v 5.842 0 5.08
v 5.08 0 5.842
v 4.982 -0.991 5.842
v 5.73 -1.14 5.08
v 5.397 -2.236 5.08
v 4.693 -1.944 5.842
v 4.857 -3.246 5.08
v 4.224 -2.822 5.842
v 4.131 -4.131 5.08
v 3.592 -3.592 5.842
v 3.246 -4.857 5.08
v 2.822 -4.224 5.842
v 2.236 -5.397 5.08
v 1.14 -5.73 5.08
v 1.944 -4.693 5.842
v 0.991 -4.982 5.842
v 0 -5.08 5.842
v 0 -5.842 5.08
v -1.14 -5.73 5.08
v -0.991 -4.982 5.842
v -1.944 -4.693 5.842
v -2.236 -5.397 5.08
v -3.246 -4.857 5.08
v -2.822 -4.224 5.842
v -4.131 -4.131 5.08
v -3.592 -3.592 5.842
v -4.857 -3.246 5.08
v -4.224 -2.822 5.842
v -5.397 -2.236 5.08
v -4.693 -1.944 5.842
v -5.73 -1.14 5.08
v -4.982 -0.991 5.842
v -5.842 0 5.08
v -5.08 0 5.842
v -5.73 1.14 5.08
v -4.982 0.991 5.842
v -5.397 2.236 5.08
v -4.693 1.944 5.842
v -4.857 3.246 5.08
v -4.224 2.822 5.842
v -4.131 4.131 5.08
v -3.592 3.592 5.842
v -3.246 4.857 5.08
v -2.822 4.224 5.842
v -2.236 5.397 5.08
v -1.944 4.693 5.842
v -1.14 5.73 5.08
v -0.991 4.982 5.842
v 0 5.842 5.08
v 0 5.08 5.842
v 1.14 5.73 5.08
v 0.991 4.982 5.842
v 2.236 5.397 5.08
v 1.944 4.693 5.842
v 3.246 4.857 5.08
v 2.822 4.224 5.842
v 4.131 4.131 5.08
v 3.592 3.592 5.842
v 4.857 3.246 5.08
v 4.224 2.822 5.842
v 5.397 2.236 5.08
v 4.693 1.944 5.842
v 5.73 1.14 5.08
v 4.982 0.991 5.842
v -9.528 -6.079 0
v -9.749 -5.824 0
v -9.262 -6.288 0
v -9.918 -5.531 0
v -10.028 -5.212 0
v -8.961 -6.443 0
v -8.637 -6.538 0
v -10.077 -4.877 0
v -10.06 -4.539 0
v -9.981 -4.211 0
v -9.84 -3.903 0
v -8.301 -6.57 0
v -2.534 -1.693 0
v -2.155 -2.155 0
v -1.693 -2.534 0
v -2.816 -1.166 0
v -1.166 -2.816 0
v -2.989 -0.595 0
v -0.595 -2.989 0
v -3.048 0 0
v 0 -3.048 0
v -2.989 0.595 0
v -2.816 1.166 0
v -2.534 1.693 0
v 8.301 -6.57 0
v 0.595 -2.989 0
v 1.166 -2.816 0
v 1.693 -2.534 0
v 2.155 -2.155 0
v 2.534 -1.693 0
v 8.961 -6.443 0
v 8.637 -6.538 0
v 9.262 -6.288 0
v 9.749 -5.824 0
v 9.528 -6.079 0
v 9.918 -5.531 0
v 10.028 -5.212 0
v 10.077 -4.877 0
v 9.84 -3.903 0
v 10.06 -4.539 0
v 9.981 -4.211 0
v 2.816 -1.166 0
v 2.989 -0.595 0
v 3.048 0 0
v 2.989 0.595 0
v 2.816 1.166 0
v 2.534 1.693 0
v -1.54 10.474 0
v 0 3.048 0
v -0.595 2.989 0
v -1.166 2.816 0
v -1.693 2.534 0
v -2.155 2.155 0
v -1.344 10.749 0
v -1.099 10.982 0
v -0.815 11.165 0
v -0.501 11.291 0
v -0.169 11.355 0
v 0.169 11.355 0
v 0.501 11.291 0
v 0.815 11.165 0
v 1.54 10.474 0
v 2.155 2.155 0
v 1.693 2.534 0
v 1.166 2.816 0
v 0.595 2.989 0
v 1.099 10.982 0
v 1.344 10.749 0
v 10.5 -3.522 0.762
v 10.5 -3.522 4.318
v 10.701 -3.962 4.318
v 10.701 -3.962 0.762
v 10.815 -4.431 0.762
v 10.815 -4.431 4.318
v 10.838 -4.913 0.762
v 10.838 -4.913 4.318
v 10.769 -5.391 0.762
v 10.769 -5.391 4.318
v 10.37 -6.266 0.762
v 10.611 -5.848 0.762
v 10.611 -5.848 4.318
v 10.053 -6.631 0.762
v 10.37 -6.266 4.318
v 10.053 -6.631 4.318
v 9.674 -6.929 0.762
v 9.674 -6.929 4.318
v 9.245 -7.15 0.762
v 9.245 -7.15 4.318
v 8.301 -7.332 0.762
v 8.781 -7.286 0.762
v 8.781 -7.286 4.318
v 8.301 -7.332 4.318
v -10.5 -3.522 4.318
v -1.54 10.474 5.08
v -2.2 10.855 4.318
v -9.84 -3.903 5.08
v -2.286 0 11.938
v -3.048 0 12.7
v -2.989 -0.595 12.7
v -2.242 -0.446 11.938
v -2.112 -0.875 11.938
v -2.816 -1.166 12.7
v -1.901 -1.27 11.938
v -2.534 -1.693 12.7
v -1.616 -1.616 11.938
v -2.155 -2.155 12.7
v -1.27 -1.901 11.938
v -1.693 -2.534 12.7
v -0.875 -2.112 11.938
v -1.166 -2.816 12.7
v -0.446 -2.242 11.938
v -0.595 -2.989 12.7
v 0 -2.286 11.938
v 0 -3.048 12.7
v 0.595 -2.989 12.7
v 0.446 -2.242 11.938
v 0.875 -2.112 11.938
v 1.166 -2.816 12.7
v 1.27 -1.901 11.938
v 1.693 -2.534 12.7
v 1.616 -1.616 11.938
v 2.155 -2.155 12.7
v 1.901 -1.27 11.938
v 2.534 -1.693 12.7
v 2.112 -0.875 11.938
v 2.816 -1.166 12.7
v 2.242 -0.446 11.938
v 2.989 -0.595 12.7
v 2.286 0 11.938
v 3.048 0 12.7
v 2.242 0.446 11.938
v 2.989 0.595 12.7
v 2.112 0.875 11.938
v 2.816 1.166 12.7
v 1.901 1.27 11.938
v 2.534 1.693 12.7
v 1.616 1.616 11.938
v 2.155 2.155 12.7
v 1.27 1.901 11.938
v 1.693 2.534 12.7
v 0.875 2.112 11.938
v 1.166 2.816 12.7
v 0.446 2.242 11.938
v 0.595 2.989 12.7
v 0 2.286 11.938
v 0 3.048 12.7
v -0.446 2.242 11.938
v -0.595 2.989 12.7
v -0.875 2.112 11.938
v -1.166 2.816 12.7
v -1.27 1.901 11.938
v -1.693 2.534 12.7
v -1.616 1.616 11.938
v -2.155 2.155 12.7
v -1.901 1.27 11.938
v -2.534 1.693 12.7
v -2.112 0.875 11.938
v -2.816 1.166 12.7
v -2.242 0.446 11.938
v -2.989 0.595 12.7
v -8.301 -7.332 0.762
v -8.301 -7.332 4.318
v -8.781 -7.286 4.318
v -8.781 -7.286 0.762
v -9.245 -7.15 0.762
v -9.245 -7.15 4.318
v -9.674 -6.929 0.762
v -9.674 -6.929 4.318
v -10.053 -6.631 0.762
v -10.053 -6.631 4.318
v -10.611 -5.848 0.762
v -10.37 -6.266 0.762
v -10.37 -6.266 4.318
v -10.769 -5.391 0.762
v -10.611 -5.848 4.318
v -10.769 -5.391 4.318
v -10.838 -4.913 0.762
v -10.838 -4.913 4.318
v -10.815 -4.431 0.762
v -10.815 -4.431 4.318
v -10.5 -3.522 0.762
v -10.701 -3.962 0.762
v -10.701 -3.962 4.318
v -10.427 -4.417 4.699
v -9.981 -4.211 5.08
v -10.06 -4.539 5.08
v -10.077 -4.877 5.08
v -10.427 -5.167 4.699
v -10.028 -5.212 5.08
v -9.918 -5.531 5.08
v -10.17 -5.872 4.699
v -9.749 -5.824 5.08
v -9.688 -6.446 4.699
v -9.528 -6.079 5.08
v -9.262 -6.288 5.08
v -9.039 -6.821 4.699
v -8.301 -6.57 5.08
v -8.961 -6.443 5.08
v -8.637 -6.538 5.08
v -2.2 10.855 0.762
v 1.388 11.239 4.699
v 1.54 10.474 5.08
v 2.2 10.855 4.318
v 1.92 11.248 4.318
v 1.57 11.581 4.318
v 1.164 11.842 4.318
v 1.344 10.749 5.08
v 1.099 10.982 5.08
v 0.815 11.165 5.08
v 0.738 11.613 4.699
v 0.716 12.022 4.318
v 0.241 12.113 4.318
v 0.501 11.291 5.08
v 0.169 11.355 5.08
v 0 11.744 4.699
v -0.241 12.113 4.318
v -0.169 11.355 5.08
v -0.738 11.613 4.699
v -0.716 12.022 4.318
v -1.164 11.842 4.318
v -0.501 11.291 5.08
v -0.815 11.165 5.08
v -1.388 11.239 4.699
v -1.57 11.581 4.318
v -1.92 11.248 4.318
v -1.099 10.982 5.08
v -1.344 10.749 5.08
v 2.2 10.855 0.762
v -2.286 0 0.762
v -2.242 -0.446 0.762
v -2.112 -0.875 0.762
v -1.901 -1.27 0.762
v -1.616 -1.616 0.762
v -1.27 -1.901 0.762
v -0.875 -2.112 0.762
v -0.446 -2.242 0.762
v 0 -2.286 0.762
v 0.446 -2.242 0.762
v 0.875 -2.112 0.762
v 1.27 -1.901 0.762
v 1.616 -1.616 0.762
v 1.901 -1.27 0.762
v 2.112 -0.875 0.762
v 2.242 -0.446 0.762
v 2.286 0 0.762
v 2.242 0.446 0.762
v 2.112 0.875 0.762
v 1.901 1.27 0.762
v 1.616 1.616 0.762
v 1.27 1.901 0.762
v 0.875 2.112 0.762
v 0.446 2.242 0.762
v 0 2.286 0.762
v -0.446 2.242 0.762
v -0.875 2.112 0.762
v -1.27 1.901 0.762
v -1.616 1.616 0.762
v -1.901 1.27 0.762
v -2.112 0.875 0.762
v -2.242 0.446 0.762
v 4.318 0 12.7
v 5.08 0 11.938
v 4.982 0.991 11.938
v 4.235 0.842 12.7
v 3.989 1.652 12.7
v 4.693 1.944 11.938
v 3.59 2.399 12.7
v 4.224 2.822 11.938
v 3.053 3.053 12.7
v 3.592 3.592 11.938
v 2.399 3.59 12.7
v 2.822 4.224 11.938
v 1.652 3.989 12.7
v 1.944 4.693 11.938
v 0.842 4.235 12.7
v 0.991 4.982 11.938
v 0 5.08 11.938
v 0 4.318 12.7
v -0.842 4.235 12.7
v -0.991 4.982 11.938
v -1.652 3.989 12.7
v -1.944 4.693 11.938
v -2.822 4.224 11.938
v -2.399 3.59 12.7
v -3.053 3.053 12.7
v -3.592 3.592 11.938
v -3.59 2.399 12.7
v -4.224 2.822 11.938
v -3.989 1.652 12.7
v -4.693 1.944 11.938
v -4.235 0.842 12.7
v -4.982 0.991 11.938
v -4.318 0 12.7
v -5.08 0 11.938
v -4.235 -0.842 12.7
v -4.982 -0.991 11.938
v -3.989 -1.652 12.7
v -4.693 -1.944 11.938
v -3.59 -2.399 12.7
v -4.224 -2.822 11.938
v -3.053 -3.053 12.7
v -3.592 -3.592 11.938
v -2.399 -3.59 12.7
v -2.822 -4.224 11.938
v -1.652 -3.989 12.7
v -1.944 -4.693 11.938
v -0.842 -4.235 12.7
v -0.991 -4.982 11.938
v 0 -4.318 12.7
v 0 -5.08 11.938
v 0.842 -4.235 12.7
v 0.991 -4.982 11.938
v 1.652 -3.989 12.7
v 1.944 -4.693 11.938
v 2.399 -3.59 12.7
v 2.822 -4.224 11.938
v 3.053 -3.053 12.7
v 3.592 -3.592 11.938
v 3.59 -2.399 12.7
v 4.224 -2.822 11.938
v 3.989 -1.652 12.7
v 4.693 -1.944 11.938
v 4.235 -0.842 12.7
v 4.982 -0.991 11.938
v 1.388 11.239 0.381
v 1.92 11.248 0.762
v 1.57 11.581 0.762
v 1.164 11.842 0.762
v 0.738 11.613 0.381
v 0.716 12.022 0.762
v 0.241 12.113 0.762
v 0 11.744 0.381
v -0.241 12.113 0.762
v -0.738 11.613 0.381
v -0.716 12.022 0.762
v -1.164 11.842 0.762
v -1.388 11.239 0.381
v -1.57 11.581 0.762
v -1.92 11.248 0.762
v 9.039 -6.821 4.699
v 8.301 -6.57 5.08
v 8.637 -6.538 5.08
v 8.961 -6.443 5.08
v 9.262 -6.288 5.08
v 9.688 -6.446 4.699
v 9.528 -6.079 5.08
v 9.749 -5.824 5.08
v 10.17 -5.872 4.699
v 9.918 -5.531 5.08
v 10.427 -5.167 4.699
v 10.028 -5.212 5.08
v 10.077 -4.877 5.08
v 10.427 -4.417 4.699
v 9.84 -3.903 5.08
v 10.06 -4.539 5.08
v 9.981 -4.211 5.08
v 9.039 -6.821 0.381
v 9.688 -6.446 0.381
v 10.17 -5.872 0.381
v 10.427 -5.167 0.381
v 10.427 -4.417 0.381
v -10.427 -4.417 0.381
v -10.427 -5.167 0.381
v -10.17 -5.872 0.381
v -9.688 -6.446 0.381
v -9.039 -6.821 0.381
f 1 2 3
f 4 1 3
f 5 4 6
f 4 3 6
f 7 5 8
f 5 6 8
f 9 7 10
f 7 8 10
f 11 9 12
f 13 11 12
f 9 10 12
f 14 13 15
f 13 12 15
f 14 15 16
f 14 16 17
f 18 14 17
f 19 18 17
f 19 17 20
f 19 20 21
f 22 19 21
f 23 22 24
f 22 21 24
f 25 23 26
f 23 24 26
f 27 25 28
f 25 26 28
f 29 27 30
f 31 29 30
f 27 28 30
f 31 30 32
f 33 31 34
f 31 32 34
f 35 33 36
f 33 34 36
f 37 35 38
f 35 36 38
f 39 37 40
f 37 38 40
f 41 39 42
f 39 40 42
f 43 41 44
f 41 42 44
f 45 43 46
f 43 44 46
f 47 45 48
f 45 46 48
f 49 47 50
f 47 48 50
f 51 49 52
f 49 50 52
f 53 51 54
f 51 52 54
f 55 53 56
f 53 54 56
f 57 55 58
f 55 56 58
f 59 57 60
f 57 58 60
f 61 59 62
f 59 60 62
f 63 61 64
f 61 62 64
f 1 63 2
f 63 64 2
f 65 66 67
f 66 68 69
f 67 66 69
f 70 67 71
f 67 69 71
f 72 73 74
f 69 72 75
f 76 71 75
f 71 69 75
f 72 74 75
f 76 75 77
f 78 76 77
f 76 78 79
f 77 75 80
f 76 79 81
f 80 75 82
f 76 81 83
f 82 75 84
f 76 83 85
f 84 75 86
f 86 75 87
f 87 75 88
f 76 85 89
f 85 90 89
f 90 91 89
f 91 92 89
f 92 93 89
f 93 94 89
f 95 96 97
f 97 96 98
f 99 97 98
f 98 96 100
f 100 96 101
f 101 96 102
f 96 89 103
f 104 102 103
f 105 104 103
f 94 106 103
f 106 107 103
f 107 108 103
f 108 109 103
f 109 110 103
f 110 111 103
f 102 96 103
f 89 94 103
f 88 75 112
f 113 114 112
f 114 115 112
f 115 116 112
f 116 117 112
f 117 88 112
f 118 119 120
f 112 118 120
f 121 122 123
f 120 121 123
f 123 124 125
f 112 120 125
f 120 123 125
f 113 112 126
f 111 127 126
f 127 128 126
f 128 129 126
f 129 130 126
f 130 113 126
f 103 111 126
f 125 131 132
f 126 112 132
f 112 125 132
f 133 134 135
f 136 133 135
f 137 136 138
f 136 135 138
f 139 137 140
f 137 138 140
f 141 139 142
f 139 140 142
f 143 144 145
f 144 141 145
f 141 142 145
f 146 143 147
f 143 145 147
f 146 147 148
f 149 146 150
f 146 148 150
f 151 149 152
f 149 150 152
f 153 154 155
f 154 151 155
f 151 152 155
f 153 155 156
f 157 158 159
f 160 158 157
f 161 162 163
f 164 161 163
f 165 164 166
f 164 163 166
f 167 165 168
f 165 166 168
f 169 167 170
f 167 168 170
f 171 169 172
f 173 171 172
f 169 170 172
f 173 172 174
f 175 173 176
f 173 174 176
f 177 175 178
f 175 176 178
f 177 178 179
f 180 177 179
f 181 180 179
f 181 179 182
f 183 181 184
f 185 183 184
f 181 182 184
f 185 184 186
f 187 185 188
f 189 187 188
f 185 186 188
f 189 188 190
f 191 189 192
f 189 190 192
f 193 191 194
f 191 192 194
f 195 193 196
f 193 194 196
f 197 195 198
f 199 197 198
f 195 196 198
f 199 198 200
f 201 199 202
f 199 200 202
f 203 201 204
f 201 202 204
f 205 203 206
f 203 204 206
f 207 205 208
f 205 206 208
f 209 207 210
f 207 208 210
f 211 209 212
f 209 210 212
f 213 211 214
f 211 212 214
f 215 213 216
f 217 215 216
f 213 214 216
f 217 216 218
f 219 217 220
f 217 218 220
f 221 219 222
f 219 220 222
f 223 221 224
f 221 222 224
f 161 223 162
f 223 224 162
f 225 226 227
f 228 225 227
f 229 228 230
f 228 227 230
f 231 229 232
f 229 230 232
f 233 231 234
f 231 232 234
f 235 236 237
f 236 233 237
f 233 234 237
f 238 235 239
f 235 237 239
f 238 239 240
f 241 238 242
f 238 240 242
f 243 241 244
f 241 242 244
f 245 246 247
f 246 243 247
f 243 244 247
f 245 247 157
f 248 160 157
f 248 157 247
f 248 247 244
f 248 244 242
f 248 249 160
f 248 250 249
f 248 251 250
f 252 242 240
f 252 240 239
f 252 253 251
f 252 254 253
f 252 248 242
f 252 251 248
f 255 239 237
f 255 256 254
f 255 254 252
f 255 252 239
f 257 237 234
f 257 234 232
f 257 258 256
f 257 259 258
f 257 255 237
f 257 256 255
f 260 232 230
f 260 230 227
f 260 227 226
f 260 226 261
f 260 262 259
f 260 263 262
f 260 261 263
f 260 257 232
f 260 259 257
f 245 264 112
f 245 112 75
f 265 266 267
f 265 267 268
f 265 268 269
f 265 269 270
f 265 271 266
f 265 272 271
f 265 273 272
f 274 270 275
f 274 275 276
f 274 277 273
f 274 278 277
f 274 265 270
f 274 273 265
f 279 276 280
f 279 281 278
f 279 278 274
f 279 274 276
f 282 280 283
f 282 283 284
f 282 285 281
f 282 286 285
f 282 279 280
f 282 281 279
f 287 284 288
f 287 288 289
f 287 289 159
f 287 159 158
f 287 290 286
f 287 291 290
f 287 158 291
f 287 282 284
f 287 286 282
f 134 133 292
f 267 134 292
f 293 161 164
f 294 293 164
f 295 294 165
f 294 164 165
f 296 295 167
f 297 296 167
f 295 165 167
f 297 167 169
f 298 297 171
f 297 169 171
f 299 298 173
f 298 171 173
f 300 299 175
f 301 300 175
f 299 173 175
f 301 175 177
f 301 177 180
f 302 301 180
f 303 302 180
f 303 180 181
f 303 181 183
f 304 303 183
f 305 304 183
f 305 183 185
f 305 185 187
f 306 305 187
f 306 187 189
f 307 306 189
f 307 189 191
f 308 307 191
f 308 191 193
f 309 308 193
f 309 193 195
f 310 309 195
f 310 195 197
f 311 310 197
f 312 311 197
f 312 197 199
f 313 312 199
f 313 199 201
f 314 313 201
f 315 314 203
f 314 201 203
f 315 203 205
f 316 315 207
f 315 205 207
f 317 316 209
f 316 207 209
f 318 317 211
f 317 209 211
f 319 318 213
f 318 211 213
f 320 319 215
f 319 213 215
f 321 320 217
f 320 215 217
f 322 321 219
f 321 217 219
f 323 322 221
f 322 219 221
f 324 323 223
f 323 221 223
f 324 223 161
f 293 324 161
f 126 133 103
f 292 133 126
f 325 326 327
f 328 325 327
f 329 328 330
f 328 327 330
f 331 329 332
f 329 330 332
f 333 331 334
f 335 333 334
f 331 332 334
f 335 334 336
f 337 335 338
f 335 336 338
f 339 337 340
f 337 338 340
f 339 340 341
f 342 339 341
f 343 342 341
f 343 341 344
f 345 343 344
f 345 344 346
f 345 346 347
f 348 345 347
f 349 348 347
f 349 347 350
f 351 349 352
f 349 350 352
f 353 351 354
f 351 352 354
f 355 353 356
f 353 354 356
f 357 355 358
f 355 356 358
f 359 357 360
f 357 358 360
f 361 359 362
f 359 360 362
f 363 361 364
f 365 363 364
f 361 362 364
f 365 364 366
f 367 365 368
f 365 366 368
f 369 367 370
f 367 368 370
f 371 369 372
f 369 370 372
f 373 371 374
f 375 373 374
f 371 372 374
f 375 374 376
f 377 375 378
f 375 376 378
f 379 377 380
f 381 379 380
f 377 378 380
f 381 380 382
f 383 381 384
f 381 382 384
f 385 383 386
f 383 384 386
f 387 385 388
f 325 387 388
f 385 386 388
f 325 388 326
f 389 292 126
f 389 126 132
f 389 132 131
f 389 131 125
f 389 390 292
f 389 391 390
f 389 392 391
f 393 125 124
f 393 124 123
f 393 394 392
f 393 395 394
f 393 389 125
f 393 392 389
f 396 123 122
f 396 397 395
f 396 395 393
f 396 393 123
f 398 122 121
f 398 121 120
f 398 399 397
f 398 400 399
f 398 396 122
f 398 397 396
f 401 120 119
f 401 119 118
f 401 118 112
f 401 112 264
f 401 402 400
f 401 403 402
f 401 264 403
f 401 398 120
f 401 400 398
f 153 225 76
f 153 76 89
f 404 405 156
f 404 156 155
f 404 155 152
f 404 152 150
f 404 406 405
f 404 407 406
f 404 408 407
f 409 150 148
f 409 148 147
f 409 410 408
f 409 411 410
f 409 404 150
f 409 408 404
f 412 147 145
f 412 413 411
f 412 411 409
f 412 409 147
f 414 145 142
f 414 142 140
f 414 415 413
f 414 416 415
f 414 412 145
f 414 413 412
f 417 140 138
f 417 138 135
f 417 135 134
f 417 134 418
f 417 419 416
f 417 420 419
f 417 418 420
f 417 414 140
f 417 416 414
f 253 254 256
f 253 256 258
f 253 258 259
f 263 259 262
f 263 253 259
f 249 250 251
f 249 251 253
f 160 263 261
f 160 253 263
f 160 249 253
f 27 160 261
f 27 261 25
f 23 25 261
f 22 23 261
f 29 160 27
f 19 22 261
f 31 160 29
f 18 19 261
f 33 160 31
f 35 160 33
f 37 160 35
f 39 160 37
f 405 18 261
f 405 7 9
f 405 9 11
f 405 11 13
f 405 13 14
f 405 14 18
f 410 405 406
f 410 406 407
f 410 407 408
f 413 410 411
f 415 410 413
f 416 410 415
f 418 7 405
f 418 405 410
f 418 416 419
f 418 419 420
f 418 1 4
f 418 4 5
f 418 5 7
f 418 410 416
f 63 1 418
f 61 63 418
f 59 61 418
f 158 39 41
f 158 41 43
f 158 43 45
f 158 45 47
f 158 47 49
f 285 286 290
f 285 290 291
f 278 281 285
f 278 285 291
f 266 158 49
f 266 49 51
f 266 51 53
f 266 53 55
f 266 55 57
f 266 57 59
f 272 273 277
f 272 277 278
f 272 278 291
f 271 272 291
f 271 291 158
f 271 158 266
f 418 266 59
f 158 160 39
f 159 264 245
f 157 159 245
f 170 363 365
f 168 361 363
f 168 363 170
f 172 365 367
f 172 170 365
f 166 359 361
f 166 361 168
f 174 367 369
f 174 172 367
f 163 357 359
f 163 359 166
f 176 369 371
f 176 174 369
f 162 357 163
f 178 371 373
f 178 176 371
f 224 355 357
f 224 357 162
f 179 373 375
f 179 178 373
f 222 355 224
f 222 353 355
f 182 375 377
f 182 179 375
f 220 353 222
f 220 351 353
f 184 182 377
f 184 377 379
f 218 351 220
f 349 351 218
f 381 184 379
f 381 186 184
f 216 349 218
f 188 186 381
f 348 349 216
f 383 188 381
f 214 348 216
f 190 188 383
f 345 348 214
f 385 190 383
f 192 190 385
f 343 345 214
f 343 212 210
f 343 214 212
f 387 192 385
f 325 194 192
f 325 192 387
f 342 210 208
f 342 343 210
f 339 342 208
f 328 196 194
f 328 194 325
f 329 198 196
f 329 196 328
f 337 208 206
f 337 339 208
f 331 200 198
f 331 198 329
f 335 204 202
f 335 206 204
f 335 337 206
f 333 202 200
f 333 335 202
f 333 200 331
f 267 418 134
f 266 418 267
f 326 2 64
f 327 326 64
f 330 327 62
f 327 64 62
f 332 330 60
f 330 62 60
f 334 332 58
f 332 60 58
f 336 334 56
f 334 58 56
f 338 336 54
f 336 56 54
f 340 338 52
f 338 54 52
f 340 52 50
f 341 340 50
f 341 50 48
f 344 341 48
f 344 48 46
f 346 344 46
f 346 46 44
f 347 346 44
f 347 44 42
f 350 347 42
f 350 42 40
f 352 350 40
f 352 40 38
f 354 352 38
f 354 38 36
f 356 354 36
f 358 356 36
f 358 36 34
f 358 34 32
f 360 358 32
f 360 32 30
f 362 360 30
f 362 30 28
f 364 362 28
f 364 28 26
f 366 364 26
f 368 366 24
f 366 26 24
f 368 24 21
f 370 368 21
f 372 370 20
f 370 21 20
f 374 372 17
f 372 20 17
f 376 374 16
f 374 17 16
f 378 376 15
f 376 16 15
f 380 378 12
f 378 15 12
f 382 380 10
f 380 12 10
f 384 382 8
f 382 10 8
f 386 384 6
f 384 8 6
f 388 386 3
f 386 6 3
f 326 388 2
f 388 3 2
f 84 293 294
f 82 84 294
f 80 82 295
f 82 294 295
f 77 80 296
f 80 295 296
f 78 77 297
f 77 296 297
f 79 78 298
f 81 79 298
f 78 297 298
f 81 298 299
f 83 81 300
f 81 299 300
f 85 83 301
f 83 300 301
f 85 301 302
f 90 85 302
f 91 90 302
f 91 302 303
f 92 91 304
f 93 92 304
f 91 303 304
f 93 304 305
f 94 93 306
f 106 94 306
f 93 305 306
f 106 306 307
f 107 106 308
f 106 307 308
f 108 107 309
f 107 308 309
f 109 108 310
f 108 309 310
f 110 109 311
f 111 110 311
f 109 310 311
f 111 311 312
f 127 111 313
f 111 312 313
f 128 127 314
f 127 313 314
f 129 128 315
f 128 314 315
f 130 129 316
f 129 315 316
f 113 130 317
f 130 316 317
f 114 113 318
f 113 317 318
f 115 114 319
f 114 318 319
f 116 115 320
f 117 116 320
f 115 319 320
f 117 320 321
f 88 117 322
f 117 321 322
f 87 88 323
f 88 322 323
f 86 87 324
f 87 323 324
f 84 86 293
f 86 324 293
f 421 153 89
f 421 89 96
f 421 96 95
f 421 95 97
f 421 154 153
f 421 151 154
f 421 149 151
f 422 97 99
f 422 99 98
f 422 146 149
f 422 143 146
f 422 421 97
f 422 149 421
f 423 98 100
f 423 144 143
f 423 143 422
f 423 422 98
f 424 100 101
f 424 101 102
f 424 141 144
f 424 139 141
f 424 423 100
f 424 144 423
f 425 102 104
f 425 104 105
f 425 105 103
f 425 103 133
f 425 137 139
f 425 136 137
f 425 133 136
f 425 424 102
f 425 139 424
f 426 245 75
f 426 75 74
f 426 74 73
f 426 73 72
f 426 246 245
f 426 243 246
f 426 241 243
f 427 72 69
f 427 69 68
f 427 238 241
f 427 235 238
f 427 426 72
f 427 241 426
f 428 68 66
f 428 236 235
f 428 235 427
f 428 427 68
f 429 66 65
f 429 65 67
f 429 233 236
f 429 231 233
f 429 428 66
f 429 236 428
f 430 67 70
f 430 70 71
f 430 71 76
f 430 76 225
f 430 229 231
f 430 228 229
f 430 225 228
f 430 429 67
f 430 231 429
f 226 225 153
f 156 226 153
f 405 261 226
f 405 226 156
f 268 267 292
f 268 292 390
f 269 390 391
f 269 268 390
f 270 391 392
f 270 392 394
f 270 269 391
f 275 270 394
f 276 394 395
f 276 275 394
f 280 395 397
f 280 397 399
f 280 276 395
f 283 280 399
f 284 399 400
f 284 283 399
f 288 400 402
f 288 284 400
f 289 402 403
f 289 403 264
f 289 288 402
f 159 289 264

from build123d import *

# Parameters (mm, degrees)
F1_DEPTH = 5.08
F2_R     = 5.08
F3_DEPTH = 12.7
F4_D     = 4.572
F5_R     = 2.54
F6_SIZE  = 0.762


with BuildPart() as f1:
    # F0 (on Top) → F1 (new body)
    with BuildSketch(Plane.XY):
        Polygon((12.7, -7.3323484187), (0, 14.6646968374), (-12.7, -7.3323484187), align=None)
    extrude(amount=F1_DEPTH)

    # F2 (on Top) → F3 (join)
    with BuildSketch(Plane.XY):
        Circle(F2_R)
    extrude(amount=F3_DEPTH)

    # F4 (through all)
    with Locations(Plane(origin=(0, 0, 0), x_dir=(1, 0, 0), z_dir=(0, 0, -1))):
        with Locations((0, 0)):
            Hole(F4_D / 2)

    # F5
    f5_edges = [f1.edges().sort_by_distance(p)[0] for p in [
        (-12.7, -7.332348, 2.54),
        (12.7, -7.332348, 2.54),
        (0, 14.664697, 2.54),
    ]]
    fillet(f5_edges, radius=F5_R)

    # F6
    f6_edges = [f1.edges().sort_by_distance(p)[0] for p in [
        (6.35, 3.666174, 0),
        (10.500295, -6.062348, 0),
        (0, 12.124697, 0),
        (0, -7.332348, 0),
        (-6.35, 3.666174, 0),
        (-10.500295, -6.062348, 0),
        (-2.286, 0, 0),
        (-5.08, 0, 12.7),
        (-2.286, 0, 12.7),
        (6.35, 3.666174, 5.08),
        (10.500295, -6.062348, 5.08),
        (0, 12.124697, 5.08),
        (0, -7.332348, 5.08),
        (-6.35, 3.666174, 5.08),
        (-10.500295, -6.062348, 5.08),
        (-5.08, 0, 5.08),
    ]]
    chamfer(f6_edges, length=F6_SIZE)


solid = f1.part
